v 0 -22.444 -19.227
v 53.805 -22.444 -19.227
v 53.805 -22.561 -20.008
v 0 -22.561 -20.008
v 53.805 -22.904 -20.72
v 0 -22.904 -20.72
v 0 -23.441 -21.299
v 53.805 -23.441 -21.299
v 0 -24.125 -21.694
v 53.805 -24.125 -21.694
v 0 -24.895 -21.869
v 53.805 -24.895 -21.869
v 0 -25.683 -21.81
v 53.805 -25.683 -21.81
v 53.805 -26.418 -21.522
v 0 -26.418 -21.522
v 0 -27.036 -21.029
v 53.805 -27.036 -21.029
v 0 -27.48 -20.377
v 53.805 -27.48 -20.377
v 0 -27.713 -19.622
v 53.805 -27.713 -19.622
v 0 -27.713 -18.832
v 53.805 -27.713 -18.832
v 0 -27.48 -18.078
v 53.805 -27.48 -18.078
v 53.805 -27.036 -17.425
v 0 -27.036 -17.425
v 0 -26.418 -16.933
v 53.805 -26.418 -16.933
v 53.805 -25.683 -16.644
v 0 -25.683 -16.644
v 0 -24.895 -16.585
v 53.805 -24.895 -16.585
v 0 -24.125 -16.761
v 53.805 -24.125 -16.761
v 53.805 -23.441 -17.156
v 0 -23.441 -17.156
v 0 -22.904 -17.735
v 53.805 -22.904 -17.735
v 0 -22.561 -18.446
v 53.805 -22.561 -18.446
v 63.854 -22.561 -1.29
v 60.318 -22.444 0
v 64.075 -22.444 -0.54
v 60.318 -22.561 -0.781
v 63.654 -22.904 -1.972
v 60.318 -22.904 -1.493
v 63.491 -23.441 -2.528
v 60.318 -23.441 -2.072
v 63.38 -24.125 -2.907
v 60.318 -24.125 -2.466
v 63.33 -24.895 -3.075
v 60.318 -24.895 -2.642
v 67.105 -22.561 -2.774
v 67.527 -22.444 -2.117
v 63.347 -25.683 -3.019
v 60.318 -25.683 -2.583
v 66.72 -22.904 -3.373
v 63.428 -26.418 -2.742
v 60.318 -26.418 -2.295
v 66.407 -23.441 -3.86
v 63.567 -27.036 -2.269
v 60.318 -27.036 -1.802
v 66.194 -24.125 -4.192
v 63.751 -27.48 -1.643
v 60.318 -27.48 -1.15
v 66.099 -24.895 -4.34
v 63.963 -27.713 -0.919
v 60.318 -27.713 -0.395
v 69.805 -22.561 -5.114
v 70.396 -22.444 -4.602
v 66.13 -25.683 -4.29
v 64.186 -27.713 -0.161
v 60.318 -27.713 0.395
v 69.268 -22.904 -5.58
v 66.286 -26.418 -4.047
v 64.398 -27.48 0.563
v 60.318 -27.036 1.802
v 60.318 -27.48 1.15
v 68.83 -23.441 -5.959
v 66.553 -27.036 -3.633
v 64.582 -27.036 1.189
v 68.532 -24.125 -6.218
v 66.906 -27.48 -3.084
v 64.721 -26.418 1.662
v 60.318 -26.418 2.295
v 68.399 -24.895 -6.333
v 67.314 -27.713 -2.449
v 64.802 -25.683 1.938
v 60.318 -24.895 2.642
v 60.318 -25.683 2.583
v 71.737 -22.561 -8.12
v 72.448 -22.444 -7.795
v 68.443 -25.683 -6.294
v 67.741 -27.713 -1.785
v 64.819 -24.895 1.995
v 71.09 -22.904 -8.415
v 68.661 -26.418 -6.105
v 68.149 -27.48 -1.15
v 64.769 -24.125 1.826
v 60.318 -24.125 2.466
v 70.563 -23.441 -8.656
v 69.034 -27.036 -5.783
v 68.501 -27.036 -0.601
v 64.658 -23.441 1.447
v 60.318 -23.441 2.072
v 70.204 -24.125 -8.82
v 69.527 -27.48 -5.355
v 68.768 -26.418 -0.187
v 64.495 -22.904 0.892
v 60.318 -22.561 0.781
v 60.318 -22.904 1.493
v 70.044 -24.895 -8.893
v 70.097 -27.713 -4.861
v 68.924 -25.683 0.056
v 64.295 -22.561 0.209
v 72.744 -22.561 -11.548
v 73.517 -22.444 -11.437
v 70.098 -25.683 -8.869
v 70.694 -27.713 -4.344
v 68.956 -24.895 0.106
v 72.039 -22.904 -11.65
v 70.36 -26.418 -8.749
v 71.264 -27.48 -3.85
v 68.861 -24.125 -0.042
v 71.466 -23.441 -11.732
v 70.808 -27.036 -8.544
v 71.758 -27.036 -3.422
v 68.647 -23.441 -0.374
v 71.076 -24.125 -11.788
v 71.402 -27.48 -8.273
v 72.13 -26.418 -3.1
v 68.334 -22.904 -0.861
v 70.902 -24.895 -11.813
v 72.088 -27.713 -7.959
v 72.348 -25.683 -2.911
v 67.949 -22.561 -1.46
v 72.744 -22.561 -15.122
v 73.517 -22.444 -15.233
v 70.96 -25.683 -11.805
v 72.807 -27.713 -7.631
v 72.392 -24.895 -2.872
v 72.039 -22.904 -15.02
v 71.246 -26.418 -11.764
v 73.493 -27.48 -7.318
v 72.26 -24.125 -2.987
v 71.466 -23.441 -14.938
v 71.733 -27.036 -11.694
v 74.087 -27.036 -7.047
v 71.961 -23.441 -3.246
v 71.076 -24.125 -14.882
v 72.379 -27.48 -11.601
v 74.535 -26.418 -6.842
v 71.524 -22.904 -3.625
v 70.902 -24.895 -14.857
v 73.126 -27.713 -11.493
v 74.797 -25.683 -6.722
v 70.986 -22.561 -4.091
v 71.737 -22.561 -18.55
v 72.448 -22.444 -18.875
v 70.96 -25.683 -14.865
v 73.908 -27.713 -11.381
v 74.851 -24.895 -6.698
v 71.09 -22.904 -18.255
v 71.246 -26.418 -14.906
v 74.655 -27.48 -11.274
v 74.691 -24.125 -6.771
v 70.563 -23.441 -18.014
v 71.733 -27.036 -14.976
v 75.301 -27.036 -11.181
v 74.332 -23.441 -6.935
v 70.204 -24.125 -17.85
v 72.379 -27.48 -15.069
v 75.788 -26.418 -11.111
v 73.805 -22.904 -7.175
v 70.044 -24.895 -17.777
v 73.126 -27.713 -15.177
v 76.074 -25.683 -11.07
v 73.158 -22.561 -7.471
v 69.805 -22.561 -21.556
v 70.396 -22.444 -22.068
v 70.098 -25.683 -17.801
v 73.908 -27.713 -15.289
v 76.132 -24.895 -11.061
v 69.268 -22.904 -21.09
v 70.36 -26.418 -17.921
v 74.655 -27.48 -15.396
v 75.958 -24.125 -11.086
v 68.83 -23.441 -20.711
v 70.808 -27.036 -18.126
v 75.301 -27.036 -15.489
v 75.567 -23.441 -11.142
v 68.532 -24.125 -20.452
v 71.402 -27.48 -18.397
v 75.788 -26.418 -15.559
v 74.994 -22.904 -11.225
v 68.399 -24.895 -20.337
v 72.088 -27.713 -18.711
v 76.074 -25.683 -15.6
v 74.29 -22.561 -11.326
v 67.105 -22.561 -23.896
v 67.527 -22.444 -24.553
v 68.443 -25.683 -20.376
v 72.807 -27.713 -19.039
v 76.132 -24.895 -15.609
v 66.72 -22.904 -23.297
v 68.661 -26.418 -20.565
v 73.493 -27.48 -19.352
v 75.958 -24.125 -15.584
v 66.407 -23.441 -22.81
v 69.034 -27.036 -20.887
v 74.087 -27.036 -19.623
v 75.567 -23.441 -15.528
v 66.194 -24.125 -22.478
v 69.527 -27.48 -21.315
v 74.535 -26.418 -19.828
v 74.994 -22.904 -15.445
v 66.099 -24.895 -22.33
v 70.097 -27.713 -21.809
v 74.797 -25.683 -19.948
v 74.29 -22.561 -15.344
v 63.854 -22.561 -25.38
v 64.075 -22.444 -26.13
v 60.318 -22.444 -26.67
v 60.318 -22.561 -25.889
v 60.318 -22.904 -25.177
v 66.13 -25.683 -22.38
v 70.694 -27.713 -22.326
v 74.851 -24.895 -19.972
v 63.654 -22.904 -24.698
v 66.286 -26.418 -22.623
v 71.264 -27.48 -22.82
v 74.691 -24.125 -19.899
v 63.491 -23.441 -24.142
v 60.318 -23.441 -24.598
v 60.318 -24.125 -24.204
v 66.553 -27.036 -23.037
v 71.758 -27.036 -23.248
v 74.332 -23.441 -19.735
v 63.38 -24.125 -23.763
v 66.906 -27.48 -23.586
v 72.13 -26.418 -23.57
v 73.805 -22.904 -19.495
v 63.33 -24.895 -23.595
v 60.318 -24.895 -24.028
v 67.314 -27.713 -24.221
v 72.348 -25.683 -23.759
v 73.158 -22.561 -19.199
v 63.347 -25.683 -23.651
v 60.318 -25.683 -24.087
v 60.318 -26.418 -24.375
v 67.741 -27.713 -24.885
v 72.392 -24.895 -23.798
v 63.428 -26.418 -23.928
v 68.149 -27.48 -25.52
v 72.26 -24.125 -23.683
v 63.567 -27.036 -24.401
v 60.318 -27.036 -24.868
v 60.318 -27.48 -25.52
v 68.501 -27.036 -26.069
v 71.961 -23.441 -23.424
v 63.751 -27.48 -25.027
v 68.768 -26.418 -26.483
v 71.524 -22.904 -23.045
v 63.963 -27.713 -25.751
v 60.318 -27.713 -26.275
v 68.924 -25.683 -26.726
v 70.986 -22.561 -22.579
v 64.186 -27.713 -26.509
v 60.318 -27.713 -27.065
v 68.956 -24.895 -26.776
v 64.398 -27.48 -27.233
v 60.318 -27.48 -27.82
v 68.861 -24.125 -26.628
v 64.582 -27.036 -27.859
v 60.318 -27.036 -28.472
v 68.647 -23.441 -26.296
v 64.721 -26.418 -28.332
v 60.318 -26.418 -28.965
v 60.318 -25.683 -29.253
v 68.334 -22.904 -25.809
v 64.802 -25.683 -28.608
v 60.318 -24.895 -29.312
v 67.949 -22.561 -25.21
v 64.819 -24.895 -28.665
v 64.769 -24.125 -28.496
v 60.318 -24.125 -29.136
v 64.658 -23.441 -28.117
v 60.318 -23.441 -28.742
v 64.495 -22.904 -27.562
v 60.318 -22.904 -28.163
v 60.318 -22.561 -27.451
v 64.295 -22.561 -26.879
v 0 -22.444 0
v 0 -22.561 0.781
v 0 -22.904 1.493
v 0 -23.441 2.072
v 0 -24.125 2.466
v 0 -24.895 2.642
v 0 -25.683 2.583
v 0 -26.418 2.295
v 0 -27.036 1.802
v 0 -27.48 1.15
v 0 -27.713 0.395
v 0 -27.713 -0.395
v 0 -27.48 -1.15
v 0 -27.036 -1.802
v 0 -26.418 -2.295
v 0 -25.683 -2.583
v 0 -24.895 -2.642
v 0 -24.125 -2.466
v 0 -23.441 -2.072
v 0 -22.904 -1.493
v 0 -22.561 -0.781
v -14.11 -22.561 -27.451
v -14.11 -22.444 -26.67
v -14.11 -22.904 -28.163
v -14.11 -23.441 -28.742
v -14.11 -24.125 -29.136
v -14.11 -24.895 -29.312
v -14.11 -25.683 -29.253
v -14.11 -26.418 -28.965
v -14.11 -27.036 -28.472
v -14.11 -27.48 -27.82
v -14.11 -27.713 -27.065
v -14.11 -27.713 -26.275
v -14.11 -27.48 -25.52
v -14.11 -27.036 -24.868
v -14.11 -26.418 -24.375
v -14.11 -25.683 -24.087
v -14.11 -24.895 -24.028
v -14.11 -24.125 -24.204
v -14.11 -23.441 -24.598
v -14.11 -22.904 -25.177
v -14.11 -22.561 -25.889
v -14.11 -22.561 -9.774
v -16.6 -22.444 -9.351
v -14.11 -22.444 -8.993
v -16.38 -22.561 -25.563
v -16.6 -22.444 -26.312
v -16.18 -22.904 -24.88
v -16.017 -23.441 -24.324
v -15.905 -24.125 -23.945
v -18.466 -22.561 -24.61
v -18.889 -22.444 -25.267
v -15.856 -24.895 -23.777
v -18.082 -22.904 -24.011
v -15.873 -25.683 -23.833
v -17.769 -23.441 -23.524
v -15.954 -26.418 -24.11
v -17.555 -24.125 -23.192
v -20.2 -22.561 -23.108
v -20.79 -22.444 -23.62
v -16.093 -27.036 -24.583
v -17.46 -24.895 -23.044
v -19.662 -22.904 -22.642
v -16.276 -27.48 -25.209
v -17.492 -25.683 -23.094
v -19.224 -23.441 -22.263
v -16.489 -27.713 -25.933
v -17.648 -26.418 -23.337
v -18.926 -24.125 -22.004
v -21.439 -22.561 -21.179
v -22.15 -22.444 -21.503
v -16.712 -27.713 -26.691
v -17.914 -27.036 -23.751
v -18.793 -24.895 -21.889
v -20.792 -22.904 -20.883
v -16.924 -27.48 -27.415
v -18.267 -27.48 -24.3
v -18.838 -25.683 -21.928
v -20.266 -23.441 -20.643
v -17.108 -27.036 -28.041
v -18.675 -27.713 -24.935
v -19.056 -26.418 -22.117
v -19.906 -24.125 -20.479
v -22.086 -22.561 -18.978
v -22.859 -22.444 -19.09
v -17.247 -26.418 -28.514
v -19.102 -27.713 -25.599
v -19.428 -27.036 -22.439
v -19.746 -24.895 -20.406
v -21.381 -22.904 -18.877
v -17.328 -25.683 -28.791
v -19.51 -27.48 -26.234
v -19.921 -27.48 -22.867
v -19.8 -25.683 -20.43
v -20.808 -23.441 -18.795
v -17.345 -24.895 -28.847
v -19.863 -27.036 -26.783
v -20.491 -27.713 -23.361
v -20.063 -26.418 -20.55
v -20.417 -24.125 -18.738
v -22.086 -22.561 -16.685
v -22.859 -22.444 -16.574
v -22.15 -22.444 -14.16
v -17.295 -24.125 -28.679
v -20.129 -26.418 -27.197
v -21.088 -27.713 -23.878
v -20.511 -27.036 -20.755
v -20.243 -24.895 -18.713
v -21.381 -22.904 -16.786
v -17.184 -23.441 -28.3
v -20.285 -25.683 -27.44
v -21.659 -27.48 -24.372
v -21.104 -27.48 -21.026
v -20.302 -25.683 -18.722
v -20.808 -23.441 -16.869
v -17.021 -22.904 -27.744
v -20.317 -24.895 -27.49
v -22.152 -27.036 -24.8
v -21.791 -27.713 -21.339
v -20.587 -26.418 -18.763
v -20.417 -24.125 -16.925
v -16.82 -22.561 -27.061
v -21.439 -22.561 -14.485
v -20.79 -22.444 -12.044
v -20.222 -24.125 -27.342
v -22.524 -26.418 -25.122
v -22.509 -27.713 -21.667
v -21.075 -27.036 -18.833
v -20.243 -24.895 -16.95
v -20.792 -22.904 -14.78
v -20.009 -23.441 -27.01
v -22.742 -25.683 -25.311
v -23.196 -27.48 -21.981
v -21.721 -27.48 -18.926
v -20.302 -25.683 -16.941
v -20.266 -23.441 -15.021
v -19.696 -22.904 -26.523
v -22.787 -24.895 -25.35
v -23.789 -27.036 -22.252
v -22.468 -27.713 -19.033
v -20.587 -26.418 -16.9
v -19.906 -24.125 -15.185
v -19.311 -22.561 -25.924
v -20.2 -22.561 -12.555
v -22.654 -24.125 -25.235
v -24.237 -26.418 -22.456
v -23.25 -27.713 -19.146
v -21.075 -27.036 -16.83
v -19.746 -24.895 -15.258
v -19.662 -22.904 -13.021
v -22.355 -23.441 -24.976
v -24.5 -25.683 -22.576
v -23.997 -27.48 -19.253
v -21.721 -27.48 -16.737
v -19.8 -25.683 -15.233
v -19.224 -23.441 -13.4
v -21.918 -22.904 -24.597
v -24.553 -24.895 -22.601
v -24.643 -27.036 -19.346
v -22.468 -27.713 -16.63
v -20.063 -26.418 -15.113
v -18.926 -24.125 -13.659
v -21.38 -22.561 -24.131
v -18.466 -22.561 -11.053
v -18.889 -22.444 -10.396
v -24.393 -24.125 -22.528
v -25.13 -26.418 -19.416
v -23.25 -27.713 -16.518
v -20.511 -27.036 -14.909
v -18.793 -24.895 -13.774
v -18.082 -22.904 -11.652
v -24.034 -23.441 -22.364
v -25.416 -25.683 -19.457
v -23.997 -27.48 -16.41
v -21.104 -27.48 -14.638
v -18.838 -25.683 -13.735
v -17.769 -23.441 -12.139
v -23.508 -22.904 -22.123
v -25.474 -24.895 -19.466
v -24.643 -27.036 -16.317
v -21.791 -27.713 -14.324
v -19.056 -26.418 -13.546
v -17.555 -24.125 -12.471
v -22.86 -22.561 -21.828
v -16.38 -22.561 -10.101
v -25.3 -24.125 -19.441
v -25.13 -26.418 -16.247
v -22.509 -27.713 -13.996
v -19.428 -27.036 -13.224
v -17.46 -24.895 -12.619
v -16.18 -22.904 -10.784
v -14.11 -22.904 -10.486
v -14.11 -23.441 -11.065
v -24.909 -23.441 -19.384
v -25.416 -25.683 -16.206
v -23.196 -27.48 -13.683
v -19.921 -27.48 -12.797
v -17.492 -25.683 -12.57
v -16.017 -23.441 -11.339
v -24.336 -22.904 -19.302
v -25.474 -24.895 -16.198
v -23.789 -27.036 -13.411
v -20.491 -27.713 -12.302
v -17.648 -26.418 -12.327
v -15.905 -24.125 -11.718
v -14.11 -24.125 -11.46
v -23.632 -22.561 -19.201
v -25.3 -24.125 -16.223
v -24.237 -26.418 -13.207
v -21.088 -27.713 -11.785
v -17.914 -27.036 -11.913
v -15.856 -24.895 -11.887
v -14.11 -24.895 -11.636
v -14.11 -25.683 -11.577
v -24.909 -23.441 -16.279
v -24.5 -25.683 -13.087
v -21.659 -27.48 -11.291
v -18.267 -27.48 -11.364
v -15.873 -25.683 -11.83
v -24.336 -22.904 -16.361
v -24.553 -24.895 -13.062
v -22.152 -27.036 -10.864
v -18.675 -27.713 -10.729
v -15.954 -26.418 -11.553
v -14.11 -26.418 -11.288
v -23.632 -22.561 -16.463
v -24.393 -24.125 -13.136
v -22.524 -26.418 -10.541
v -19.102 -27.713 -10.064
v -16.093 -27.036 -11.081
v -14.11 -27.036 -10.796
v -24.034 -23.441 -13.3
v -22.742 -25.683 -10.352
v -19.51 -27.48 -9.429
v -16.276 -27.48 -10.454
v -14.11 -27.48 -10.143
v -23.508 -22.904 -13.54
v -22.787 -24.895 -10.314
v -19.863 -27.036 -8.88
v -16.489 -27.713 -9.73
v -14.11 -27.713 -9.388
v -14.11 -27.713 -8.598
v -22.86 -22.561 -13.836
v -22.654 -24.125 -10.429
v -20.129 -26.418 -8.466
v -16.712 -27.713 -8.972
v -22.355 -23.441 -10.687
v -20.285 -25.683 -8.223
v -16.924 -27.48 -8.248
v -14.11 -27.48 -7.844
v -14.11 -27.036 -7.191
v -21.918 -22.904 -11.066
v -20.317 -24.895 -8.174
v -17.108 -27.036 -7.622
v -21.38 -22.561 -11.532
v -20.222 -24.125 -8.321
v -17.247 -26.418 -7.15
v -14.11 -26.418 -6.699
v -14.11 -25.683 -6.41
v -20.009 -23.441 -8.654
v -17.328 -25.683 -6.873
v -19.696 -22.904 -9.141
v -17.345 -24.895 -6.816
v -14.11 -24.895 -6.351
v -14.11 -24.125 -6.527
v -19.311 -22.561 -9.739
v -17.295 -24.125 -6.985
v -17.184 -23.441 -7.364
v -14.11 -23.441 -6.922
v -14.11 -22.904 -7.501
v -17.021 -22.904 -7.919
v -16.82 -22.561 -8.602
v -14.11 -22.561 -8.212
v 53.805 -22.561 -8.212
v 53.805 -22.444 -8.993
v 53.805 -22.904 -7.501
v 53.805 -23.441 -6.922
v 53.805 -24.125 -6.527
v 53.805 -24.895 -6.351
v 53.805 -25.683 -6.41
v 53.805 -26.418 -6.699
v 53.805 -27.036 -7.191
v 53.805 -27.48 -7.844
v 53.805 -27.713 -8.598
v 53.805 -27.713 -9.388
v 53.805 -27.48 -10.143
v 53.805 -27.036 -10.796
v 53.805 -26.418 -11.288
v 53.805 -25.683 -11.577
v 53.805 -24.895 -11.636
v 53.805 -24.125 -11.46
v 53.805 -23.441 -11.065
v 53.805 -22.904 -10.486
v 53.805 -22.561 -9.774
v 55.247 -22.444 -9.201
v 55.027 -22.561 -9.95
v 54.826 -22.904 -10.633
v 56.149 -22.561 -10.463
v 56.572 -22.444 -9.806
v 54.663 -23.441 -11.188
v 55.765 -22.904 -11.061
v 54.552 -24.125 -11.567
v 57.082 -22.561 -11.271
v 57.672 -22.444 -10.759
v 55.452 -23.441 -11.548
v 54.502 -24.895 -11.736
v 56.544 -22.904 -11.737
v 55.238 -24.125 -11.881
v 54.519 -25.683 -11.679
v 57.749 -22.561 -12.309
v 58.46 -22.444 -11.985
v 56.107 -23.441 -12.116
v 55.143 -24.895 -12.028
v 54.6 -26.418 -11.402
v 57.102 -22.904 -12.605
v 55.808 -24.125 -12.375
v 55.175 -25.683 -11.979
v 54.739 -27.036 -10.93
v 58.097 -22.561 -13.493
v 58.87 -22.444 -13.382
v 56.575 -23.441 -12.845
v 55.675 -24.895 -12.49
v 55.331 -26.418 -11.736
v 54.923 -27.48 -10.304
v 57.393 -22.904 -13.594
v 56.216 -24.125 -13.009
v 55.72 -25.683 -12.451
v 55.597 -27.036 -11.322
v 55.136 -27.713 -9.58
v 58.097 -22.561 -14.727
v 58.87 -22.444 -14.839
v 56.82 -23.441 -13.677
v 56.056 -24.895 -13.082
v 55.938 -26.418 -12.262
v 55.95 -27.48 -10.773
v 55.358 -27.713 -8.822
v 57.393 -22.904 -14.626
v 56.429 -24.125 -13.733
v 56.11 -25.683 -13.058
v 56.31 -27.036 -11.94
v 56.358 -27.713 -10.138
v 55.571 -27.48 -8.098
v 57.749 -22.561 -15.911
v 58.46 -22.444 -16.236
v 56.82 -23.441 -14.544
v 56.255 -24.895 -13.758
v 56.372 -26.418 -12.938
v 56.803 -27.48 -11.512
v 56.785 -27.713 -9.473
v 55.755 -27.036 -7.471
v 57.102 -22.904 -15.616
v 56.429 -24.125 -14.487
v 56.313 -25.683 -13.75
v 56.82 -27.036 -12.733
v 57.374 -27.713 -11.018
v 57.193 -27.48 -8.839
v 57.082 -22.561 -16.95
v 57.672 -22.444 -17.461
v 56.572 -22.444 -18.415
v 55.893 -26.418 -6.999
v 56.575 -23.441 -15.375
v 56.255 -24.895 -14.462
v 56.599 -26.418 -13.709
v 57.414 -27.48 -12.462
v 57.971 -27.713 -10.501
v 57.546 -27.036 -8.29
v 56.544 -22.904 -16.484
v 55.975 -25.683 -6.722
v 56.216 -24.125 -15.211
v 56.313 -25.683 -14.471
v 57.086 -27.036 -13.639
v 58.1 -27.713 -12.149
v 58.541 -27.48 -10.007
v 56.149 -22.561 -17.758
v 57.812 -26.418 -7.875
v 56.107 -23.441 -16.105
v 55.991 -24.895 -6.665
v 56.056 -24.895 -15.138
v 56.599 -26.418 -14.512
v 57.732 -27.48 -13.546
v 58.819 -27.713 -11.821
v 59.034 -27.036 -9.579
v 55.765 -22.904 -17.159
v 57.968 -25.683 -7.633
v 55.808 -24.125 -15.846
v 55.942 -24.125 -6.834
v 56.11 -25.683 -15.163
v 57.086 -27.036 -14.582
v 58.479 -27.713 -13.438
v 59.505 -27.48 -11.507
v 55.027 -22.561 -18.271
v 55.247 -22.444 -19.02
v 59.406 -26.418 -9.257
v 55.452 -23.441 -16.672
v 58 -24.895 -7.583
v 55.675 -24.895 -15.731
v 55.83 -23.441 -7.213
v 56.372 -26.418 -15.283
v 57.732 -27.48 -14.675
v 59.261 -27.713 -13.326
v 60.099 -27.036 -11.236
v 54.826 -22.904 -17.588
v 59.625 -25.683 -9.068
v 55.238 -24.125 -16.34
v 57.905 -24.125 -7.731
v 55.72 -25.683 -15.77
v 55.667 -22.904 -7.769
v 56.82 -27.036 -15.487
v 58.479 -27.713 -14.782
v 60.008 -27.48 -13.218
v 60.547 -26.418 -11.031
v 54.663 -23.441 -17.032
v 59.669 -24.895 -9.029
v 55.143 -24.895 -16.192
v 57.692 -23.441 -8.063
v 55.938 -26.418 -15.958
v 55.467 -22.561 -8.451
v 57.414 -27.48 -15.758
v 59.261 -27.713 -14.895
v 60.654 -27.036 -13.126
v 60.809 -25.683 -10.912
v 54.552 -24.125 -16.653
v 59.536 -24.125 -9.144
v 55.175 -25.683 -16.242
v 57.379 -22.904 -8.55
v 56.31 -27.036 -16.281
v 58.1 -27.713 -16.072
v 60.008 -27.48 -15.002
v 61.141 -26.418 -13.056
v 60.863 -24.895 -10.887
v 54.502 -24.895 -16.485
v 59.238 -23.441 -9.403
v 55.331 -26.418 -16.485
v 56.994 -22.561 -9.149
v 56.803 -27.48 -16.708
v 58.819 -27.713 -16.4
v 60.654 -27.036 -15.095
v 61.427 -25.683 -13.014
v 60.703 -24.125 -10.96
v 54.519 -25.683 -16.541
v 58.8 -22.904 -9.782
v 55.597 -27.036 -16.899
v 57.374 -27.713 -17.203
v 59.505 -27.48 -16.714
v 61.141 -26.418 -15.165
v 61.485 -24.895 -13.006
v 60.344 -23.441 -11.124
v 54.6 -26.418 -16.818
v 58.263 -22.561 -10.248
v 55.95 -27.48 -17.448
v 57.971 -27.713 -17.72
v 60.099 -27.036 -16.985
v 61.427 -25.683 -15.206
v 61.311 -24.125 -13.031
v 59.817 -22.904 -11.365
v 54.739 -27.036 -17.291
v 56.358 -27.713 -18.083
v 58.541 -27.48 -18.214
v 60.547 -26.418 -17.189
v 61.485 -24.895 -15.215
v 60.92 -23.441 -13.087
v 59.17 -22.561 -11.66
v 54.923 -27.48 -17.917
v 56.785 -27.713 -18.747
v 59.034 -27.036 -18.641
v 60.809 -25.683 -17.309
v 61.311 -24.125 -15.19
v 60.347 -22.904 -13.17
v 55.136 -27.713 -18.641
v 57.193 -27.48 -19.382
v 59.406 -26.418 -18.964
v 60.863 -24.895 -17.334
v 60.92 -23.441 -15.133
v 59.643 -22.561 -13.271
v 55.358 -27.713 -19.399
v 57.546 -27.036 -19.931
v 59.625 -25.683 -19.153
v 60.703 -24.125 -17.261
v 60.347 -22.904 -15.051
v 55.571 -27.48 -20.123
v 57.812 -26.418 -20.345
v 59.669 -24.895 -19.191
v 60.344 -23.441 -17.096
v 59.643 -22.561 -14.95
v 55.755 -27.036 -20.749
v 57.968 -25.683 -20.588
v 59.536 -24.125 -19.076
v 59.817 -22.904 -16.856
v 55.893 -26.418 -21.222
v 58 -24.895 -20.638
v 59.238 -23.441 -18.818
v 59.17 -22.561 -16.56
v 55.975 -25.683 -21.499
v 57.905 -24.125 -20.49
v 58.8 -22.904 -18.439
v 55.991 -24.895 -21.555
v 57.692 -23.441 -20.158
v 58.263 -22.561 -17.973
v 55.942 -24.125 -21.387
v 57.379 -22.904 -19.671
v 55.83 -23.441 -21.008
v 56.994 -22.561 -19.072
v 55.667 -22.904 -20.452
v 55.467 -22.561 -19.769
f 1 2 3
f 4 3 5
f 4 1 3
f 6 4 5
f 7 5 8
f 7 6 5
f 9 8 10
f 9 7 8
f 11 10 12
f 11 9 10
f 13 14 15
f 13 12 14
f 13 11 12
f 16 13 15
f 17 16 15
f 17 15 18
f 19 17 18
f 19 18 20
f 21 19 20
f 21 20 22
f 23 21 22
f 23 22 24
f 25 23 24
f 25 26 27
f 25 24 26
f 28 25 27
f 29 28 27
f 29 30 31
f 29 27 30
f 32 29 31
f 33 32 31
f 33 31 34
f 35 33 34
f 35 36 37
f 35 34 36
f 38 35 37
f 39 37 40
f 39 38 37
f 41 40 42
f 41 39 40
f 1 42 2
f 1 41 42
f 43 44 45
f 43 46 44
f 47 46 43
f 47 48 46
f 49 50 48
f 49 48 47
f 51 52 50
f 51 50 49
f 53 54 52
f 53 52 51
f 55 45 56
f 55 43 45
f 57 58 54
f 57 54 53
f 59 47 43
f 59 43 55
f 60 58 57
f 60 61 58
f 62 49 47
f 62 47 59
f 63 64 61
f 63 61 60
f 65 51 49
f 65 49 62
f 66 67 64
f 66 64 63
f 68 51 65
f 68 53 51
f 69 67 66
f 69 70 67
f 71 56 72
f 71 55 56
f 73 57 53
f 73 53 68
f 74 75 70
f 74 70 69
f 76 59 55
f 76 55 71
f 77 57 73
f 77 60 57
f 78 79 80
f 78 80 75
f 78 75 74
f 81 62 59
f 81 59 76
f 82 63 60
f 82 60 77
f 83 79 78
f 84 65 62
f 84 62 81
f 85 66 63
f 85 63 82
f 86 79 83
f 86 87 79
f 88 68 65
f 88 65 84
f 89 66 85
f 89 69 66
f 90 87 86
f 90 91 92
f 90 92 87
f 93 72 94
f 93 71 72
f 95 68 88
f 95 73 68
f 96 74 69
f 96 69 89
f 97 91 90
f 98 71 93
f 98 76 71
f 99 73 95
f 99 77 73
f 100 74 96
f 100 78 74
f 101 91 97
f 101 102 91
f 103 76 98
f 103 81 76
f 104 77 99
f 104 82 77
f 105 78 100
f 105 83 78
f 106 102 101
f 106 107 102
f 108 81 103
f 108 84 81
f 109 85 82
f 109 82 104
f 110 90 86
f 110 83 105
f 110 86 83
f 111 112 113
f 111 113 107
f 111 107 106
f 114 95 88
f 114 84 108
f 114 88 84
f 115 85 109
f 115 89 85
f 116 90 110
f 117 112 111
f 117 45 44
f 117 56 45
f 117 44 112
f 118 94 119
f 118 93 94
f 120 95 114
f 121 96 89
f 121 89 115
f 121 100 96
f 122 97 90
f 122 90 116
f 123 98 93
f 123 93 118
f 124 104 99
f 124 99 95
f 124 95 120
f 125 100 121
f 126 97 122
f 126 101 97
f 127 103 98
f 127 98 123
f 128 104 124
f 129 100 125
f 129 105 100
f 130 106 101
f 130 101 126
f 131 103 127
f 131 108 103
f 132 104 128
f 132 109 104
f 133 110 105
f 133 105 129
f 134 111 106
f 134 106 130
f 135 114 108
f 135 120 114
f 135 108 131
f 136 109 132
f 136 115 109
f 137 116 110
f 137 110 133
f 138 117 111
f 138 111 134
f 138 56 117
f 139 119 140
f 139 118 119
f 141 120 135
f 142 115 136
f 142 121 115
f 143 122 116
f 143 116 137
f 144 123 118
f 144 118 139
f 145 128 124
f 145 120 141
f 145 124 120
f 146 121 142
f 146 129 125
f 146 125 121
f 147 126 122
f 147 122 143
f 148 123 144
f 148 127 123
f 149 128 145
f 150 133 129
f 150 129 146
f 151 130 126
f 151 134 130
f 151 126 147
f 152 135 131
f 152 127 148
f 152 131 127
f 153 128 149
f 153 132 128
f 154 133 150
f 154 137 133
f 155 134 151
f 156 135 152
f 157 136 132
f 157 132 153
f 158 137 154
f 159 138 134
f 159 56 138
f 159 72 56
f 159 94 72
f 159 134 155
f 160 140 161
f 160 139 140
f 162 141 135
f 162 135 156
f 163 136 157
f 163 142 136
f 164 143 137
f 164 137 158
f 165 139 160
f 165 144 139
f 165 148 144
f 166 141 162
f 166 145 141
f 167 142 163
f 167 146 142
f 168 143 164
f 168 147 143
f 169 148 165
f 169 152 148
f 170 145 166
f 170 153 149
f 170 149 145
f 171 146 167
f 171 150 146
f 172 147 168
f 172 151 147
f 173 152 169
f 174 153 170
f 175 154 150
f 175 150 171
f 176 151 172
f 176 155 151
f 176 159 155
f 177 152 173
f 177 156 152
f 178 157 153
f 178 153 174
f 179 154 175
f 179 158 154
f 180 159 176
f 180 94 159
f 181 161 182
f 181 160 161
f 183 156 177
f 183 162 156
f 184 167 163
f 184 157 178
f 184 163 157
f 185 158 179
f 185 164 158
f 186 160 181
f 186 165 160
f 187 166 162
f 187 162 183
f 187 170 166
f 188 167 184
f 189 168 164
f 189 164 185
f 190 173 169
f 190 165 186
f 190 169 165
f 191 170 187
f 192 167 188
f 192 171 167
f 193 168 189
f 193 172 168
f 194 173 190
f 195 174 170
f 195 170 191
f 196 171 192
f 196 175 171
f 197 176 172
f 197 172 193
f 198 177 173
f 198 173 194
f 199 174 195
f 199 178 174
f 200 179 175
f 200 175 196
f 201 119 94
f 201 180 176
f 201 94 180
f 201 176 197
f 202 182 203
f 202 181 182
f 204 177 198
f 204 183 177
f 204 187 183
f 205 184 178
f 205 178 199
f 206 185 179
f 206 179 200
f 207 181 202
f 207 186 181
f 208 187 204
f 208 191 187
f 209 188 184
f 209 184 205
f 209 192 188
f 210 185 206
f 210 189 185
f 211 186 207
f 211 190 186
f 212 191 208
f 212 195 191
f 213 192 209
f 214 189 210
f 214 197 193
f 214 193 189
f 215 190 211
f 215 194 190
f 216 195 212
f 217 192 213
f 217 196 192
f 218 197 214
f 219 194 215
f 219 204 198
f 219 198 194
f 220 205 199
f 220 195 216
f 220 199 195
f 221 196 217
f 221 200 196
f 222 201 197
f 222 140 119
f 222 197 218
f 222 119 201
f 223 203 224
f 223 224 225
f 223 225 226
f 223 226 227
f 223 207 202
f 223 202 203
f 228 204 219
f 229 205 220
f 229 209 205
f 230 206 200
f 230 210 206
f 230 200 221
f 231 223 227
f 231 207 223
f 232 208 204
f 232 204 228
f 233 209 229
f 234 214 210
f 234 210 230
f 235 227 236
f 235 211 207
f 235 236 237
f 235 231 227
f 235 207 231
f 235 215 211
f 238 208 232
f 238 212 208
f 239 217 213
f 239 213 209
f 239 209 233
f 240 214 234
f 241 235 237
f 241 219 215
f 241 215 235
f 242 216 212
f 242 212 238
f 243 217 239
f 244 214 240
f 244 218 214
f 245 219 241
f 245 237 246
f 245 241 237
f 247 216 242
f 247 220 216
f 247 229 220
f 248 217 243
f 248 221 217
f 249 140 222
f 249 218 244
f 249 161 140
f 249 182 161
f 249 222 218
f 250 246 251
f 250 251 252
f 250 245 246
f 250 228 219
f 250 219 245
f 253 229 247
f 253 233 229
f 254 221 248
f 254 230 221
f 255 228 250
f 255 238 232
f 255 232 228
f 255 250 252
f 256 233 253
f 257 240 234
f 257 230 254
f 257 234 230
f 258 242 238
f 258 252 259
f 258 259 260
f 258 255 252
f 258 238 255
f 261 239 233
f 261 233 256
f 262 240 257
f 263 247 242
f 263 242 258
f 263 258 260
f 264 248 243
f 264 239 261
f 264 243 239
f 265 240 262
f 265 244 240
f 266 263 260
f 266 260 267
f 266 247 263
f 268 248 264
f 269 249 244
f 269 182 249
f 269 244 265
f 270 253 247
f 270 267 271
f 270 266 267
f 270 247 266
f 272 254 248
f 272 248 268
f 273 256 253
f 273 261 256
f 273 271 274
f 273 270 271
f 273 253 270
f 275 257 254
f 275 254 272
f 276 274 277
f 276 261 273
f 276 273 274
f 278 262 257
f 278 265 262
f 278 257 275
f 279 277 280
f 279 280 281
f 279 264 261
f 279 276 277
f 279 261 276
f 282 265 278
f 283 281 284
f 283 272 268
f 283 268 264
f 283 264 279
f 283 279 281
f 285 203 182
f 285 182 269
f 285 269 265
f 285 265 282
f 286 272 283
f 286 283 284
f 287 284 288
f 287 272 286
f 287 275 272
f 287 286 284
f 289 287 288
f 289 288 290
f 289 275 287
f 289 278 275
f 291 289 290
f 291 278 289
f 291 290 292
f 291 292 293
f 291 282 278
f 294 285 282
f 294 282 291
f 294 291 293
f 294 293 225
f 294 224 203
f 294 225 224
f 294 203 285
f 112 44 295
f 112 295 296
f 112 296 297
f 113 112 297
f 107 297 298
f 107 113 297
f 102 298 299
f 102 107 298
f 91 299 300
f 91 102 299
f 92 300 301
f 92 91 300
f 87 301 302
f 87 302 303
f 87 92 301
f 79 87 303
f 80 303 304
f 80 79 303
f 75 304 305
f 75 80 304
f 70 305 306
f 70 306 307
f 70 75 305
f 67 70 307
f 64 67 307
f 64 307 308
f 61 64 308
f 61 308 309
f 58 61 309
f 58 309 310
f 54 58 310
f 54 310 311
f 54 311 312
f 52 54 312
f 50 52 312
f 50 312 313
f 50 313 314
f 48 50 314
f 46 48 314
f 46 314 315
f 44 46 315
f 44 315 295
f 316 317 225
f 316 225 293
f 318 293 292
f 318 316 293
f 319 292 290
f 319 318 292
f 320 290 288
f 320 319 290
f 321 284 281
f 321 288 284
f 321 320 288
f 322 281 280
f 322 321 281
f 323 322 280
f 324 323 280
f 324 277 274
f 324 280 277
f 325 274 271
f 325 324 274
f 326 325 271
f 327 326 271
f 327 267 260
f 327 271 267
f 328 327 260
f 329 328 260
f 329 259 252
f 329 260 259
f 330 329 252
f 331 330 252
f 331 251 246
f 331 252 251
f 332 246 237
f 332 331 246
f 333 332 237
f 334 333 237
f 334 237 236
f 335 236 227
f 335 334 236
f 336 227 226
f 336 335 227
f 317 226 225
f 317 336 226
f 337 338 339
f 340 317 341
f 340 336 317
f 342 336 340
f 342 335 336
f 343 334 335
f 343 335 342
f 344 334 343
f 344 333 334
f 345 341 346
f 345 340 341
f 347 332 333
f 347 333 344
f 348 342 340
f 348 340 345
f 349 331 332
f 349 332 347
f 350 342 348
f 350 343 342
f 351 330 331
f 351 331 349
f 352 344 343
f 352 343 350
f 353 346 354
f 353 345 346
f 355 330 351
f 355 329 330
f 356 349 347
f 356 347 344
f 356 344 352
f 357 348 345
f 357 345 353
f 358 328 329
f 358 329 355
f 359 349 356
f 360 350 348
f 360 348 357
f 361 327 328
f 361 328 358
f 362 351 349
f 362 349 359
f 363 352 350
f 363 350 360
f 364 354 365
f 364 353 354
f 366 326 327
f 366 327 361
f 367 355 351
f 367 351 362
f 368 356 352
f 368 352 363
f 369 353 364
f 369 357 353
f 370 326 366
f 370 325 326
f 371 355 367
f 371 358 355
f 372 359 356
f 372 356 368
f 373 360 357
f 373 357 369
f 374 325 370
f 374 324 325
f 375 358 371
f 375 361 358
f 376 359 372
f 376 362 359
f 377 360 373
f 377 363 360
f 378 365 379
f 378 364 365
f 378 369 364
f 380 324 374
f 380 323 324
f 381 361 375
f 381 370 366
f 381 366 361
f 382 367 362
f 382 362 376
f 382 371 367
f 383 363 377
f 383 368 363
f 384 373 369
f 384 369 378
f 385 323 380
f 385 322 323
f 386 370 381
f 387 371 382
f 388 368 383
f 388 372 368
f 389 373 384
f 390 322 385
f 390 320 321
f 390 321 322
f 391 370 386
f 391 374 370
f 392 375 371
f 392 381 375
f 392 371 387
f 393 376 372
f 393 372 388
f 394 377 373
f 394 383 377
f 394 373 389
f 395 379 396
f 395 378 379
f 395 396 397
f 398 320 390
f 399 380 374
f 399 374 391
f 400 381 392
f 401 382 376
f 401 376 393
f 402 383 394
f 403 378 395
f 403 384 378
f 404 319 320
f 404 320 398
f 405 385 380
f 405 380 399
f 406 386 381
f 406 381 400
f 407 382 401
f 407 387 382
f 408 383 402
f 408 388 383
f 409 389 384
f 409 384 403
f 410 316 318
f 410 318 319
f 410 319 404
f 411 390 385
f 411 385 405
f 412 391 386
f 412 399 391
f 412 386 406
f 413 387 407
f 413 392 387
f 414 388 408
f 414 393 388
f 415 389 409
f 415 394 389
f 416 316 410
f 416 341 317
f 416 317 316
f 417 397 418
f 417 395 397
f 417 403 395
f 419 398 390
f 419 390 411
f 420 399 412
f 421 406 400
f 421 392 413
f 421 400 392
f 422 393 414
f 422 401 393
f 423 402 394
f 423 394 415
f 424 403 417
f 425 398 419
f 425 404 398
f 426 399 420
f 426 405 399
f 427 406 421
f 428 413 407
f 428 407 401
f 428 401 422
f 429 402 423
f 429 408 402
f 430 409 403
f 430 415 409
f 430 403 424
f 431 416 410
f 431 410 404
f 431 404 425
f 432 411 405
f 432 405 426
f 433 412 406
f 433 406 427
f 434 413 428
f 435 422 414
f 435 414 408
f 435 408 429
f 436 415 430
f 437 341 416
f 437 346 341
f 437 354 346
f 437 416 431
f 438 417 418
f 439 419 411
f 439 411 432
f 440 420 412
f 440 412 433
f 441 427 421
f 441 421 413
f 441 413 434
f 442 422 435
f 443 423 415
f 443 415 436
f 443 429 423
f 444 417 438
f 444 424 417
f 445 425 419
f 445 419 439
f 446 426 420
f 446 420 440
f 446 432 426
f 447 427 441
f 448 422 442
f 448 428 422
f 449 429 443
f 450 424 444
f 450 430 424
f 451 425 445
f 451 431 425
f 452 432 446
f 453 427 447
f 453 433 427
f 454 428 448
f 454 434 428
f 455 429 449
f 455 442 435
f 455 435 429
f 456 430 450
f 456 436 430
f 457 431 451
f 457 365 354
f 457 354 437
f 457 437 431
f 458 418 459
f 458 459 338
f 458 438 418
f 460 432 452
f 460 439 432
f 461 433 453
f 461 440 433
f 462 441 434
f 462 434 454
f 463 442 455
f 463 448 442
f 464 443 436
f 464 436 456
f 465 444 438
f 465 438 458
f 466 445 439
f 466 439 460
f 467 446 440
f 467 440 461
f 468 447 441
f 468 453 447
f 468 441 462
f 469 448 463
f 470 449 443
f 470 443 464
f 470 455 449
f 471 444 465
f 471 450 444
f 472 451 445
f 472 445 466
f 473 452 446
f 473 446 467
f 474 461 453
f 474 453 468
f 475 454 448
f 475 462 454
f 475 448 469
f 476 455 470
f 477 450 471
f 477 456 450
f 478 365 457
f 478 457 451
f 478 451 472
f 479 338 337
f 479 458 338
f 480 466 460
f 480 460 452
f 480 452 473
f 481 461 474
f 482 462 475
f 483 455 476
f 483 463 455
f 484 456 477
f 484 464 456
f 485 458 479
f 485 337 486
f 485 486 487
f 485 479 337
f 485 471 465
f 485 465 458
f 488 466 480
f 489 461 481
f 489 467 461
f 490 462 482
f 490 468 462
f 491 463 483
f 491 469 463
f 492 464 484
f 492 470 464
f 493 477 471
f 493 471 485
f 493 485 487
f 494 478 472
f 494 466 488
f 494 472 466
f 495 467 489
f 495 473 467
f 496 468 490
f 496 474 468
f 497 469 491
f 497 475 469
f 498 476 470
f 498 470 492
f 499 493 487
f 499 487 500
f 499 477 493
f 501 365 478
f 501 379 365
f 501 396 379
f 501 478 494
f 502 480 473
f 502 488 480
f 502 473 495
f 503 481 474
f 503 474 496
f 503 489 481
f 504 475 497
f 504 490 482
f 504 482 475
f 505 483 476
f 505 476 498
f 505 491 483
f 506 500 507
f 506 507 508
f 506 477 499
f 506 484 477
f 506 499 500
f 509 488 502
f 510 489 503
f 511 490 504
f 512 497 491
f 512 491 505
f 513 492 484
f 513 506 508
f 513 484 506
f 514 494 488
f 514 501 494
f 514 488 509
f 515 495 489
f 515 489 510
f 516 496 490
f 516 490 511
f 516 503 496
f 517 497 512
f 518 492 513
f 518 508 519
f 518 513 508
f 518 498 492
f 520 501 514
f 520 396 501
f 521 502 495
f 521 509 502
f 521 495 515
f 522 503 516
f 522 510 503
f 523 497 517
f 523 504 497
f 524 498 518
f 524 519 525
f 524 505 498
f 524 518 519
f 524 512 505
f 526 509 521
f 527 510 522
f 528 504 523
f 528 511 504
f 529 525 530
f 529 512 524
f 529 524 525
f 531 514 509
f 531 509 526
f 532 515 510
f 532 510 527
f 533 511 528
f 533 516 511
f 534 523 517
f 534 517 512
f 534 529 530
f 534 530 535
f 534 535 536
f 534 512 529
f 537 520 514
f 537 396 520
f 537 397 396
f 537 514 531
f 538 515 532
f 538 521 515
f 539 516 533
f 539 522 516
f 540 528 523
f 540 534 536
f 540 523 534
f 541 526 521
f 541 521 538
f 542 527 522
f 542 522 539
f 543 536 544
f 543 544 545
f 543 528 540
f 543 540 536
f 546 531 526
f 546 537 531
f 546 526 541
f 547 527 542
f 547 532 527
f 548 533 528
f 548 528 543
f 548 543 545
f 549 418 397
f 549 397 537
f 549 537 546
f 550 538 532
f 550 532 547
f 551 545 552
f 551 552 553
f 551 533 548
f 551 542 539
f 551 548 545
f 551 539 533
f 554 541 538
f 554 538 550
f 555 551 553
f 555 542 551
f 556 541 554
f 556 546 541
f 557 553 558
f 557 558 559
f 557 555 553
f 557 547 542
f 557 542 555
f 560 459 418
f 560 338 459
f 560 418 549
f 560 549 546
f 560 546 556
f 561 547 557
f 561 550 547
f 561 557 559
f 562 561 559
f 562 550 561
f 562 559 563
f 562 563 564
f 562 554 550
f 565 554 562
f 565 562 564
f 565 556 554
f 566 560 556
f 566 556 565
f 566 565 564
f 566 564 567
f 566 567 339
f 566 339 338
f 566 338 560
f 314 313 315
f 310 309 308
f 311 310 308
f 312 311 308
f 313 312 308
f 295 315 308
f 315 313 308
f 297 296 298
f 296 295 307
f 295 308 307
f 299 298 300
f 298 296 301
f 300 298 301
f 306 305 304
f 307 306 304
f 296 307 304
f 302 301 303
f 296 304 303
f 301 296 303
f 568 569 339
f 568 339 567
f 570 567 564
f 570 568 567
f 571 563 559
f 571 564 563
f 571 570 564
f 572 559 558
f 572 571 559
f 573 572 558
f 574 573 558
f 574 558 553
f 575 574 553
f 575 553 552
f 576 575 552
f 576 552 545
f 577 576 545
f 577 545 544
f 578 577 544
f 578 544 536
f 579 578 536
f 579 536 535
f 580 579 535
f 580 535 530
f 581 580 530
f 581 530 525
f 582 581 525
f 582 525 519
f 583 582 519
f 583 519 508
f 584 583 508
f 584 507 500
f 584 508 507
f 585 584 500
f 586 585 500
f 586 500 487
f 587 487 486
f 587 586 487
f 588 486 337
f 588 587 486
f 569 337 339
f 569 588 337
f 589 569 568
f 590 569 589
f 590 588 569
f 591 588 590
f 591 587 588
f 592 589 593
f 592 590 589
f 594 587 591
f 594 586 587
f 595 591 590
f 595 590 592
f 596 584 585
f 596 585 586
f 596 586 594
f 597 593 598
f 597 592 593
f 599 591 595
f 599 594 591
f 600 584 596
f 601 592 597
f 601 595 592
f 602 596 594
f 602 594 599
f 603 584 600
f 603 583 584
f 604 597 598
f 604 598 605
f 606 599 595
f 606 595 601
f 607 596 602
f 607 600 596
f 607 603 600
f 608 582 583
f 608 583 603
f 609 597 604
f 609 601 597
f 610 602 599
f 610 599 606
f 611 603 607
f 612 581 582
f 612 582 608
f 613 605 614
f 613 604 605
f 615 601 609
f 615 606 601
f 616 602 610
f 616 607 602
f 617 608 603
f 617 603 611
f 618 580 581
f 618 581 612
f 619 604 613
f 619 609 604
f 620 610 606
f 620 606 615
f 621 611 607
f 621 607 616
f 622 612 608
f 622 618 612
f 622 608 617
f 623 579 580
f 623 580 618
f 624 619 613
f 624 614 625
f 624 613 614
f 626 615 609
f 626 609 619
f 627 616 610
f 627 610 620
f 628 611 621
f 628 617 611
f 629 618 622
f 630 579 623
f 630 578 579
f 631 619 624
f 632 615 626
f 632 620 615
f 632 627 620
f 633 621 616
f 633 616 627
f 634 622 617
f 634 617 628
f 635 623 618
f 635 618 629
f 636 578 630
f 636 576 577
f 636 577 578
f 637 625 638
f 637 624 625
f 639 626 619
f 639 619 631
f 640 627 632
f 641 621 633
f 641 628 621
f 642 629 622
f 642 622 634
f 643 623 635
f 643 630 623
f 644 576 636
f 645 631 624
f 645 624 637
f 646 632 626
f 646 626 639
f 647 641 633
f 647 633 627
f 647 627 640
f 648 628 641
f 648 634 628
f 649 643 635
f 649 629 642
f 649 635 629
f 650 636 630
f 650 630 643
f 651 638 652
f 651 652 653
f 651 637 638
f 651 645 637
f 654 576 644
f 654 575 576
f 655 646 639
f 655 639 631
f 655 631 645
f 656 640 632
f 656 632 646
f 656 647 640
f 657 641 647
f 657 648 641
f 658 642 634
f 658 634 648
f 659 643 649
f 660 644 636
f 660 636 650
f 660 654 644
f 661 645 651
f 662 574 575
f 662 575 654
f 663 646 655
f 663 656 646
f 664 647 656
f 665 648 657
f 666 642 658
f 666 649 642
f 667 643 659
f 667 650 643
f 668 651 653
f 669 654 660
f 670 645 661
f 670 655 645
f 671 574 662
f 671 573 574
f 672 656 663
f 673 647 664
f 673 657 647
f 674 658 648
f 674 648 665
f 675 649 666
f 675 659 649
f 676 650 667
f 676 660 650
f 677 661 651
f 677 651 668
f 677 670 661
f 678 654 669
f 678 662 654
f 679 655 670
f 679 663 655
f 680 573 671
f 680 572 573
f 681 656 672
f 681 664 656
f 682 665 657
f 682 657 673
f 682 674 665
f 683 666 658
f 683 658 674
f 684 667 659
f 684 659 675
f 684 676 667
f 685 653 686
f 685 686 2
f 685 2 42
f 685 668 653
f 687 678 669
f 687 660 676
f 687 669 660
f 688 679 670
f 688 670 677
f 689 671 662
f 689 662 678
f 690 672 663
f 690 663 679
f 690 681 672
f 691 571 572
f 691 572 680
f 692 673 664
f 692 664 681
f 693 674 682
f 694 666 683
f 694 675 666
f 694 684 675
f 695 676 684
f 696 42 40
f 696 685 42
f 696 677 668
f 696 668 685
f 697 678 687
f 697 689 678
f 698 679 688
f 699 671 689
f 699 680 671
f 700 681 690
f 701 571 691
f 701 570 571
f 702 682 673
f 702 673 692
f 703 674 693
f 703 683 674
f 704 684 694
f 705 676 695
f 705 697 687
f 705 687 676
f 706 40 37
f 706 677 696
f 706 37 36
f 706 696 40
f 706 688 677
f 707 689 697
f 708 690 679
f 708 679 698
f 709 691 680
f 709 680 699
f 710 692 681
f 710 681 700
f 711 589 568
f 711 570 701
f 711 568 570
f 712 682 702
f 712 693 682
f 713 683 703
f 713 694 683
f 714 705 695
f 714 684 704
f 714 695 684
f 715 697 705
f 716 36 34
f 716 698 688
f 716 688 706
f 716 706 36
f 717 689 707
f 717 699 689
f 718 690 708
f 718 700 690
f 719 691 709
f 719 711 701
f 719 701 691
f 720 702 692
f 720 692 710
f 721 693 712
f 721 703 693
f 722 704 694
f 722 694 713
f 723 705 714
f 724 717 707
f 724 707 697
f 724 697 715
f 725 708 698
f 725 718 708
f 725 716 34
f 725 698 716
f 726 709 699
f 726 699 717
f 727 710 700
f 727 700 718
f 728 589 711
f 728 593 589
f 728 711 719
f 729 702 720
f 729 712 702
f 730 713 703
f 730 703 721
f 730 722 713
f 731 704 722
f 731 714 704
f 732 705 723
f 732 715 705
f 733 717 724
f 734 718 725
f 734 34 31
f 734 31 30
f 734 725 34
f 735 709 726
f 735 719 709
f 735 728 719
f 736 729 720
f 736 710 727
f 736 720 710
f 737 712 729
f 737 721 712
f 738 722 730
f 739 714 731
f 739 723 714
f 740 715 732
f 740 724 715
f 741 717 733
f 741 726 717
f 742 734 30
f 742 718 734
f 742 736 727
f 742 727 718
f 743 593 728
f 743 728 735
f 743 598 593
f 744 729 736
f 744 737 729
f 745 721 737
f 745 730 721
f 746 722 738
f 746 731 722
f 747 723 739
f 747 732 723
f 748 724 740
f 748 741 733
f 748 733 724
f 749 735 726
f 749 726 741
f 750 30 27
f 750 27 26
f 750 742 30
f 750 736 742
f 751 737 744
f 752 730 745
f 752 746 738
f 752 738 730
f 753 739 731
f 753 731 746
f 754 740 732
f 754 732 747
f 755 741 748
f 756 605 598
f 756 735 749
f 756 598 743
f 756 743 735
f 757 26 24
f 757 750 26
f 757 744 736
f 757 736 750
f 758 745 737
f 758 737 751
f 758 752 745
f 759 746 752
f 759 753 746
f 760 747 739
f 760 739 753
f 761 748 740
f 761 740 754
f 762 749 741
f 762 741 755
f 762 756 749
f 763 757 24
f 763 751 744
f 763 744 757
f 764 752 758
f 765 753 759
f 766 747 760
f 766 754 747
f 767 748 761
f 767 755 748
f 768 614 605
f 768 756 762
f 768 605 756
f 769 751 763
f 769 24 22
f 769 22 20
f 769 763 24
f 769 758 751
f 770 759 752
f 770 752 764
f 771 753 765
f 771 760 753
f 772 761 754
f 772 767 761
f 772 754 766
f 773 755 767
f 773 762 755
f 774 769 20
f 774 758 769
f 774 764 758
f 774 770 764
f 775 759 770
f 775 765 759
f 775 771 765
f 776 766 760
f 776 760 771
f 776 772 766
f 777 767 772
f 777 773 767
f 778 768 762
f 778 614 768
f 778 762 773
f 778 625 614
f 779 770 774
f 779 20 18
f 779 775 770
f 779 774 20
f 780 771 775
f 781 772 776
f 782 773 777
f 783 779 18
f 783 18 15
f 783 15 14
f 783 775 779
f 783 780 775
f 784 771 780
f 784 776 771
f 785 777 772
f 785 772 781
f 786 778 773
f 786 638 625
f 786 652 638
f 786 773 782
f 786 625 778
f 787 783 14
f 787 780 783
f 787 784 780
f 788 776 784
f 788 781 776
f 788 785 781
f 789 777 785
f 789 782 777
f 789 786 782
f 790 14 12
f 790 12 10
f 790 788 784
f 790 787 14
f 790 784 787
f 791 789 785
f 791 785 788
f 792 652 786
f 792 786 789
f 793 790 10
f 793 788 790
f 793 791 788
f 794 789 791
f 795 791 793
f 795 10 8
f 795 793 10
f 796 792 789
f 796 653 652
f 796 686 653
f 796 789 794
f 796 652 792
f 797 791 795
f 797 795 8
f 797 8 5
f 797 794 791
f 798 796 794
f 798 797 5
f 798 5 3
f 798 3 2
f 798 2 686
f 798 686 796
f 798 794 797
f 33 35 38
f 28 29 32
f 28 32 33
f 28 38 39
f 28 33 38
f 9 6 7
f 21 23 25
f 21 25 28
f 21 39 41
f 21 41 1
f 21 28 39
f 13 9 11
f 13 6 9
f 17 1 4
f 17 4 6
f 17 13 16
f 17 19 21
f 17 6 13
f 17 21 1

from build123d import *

# Parameters (mm, degrees)
F2_R = 2.649634


with BuildPart() as f3:
    # F3: sweep along a path in F1
    with BuildLine(Plane.XZ.offset(25.4)) as f3_path:
        Line((0, 0), (60.317617, 0))
        ThreePointArc((60.317617, 0), (73.652618, -13.335001), (60.317617, -26.670001))
        Line((60.317617, -26.670001), (-14.110291, -26.670001))
        ThreePointArc((-14.110291, -26.670001), (-22.948606, -17.831687), (-14.110291, -8.993372))
        Line((-14.110291, -8.993372), (53.805172, -8.993372))
        ThreePointArc((53.805172, -8.993372), (58.922091, -14.11029), (53.805172, -19.227209))
        Line((53.805172, -19.227209), (0, -19.227209))
    # F2 (on Right) → F3 (sweep)
    with BuildSketch(Plane.YZ):
        with Locations((-25.093233, 0)):
            Circle(F2_R)
    sweep(path=f3_path.line)


solid = f3.part
